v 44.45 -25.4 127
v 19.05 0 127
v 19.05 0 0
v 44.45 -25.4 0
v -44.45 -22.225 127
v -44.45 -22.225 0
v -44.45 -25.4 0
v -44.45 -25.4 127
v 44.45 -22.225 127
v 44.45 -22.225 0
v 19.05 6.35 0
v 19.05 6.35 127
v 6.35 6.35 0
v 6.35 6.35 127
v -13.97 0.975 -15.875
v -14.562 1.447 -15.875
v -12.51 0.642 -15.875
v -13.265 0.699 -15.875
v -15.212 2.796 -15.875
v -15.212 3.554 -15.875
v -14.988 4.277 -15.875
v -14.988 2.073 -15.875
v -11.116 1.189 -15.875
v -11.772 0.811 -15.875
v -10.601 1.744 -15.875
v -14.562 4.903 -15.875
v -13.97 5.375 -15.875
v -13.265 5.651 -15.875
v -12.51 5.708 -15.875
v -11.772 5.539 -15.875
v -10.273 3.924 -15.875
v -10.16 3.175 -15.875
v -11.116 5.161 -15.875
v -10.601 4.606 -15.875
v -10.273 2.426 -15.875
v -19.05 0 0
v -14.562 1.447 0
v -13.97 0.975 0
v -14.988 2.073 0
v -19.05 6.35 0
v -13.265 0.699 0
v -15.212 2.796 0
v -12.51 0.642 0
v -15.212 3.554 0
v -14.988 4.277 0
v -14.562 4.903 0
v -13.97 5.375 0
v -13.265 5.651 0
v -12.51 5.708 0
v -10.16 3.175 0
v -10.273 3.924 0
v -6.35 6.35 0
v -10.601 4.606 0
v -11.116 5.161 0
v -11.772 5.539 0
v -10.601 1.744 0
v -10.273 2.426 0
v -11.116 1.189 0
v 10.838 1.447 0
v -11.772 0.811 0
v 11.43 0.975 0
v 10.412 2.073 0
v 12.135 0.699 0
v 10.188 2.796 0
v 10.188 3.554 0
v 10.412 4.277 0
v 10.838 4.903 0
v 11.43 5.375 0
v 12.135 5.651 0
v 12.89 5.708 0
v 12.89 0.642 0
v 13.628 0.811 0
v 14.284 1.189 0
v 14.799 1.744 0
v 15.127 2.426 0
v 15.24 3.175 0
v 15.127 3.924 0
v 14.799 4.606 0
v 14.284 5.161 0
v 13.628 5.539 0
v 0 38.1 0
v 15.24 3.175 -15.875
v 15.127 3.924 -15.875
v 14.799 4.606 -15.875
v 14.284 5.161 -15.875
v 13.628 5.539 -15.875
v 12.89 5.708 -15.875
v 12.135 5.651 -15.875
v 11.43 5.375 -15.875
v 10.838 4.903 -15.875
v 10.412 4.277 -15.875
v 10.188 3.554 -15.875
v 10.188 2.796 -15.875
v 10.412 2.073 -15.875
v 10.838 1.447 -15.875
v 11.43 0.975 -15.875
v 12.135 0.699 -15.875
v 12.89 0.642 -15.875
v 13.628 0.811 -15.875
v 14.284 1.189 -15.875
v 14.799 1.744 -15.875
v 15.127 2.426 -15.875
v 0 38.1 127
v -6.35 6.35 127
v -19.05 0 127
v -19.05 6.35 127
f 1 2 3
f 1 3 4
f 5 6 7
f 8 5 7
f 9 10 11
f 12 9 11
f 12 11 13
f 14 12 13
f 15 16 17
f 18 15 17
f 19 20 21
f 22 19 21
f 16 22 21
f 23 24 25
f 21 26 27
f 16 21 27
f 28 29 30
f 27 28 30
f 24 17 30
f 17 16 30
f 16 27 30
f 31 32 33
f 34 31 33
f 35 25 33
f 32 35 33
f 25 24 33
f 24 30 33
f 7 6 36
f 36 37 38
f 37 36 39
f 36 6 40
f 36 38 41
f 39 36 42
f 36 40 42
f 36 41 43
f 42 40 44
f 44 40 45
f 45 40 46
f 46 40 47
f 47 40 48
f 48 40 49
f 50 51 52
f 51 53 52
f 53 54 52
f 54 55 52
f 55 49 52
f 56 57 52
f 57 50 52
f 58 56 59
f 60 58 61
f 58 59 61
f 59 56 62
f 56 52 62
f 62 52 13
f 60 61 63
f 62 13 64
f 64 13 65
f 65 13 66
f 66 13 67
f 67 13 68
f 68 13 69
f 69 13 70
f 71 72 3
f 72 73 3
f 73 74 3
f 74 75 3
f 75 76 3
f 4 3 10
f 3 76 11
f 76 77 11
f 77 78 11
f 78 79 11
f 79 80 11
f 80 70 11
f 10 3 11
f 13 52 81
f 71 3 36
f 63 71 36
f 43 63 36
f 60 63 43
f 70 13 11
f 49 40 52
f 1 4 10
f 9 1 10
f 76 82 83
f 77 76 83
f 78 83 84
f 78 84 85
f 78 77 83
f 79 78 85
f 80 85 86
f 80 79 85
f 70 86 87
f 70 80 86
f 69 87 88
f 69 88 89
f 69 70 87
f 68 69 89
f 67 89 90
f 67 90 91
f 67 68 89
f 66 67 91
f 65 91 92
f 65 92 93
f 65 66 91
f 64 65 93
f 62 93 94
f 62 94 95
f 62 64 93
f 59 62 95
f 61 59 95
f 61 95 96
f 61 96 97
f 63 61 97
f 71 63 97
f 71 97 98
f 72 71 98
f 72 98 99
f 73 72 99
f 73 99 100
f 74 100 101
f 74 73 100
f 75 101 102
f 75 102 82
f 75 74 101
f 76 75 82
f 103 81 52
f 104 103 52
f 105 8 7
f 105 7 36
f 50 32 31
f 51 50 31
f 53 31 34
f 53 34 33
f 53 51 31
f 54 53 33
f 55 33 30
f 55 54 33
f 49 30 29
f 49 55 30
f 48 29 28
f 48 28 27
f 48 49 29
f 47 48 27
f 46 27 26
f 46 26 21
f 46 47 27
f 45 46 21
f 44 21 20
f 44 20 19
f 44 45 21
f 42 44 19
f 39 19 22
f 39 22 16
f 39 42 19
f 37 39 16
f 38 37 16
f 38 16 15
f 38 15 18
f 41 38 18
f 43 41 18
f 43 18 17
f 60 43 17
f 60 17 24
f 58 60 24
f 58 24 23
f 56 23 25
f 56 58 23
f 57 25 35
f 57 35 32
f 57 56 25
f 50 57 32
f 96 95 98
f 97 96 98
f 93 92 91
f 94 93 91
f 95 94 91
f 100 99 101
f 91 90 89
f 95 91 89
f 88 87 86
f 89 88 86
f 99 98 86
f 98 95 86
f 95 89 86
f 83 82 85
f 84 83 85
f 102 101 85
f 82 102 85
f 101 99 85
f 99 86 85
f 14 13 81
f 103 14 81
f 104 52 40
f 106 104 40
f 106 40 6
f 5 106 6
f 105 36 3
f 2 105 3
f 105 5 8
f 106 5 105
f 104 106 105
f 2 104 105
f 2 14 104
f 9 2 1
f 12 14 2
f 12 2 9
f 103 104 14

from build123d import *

# Parameters (mm, degrees)
F0_R     = 2.54
F1_DEPTH = 127
F2_DEPTH = 15.875


with BuildPart() as f1:
    # F0 (on Top) → F1 (new body)
    with BuildSketch(Plane.XY):
        Polygon((-19.05, 0), (0, 0), (19.05, 0), (44.45, -25.4), (44.45, -22.225), (19.05, 6.35), (6.35, 6.35), (0, 38.1), (-6.35, 6.35), (-19.05, 6.35), (-44.45, -22.225), (-44.45, -25.4), align=None)
        with Locations((-12.7, 3.175)):
            Circle(F0_R, mode=Mode.SUBTRACT)
        with Locations((12.7, 3.175)):
            Circle(F0_R, mode=Mode.SUBTRACT)
        with Locations((-12.7, 3.175)):
            Circle(F0_R)
        with Locations((12.7, 3.175)):
            Circle(F0_R)
    extrude(amount=F1_DEPTH)

    # F0 (on Top) → F2 (join)
    with BuildSketch(Plane.XY):
        with Locations((-12.7, 3.175)):
            Circle(F0_R)
        with Locations((12.7, 3.175)):
            Circle(F0_R)
    extrude(amount=-F2_DEPTH)


solid = f1.part
